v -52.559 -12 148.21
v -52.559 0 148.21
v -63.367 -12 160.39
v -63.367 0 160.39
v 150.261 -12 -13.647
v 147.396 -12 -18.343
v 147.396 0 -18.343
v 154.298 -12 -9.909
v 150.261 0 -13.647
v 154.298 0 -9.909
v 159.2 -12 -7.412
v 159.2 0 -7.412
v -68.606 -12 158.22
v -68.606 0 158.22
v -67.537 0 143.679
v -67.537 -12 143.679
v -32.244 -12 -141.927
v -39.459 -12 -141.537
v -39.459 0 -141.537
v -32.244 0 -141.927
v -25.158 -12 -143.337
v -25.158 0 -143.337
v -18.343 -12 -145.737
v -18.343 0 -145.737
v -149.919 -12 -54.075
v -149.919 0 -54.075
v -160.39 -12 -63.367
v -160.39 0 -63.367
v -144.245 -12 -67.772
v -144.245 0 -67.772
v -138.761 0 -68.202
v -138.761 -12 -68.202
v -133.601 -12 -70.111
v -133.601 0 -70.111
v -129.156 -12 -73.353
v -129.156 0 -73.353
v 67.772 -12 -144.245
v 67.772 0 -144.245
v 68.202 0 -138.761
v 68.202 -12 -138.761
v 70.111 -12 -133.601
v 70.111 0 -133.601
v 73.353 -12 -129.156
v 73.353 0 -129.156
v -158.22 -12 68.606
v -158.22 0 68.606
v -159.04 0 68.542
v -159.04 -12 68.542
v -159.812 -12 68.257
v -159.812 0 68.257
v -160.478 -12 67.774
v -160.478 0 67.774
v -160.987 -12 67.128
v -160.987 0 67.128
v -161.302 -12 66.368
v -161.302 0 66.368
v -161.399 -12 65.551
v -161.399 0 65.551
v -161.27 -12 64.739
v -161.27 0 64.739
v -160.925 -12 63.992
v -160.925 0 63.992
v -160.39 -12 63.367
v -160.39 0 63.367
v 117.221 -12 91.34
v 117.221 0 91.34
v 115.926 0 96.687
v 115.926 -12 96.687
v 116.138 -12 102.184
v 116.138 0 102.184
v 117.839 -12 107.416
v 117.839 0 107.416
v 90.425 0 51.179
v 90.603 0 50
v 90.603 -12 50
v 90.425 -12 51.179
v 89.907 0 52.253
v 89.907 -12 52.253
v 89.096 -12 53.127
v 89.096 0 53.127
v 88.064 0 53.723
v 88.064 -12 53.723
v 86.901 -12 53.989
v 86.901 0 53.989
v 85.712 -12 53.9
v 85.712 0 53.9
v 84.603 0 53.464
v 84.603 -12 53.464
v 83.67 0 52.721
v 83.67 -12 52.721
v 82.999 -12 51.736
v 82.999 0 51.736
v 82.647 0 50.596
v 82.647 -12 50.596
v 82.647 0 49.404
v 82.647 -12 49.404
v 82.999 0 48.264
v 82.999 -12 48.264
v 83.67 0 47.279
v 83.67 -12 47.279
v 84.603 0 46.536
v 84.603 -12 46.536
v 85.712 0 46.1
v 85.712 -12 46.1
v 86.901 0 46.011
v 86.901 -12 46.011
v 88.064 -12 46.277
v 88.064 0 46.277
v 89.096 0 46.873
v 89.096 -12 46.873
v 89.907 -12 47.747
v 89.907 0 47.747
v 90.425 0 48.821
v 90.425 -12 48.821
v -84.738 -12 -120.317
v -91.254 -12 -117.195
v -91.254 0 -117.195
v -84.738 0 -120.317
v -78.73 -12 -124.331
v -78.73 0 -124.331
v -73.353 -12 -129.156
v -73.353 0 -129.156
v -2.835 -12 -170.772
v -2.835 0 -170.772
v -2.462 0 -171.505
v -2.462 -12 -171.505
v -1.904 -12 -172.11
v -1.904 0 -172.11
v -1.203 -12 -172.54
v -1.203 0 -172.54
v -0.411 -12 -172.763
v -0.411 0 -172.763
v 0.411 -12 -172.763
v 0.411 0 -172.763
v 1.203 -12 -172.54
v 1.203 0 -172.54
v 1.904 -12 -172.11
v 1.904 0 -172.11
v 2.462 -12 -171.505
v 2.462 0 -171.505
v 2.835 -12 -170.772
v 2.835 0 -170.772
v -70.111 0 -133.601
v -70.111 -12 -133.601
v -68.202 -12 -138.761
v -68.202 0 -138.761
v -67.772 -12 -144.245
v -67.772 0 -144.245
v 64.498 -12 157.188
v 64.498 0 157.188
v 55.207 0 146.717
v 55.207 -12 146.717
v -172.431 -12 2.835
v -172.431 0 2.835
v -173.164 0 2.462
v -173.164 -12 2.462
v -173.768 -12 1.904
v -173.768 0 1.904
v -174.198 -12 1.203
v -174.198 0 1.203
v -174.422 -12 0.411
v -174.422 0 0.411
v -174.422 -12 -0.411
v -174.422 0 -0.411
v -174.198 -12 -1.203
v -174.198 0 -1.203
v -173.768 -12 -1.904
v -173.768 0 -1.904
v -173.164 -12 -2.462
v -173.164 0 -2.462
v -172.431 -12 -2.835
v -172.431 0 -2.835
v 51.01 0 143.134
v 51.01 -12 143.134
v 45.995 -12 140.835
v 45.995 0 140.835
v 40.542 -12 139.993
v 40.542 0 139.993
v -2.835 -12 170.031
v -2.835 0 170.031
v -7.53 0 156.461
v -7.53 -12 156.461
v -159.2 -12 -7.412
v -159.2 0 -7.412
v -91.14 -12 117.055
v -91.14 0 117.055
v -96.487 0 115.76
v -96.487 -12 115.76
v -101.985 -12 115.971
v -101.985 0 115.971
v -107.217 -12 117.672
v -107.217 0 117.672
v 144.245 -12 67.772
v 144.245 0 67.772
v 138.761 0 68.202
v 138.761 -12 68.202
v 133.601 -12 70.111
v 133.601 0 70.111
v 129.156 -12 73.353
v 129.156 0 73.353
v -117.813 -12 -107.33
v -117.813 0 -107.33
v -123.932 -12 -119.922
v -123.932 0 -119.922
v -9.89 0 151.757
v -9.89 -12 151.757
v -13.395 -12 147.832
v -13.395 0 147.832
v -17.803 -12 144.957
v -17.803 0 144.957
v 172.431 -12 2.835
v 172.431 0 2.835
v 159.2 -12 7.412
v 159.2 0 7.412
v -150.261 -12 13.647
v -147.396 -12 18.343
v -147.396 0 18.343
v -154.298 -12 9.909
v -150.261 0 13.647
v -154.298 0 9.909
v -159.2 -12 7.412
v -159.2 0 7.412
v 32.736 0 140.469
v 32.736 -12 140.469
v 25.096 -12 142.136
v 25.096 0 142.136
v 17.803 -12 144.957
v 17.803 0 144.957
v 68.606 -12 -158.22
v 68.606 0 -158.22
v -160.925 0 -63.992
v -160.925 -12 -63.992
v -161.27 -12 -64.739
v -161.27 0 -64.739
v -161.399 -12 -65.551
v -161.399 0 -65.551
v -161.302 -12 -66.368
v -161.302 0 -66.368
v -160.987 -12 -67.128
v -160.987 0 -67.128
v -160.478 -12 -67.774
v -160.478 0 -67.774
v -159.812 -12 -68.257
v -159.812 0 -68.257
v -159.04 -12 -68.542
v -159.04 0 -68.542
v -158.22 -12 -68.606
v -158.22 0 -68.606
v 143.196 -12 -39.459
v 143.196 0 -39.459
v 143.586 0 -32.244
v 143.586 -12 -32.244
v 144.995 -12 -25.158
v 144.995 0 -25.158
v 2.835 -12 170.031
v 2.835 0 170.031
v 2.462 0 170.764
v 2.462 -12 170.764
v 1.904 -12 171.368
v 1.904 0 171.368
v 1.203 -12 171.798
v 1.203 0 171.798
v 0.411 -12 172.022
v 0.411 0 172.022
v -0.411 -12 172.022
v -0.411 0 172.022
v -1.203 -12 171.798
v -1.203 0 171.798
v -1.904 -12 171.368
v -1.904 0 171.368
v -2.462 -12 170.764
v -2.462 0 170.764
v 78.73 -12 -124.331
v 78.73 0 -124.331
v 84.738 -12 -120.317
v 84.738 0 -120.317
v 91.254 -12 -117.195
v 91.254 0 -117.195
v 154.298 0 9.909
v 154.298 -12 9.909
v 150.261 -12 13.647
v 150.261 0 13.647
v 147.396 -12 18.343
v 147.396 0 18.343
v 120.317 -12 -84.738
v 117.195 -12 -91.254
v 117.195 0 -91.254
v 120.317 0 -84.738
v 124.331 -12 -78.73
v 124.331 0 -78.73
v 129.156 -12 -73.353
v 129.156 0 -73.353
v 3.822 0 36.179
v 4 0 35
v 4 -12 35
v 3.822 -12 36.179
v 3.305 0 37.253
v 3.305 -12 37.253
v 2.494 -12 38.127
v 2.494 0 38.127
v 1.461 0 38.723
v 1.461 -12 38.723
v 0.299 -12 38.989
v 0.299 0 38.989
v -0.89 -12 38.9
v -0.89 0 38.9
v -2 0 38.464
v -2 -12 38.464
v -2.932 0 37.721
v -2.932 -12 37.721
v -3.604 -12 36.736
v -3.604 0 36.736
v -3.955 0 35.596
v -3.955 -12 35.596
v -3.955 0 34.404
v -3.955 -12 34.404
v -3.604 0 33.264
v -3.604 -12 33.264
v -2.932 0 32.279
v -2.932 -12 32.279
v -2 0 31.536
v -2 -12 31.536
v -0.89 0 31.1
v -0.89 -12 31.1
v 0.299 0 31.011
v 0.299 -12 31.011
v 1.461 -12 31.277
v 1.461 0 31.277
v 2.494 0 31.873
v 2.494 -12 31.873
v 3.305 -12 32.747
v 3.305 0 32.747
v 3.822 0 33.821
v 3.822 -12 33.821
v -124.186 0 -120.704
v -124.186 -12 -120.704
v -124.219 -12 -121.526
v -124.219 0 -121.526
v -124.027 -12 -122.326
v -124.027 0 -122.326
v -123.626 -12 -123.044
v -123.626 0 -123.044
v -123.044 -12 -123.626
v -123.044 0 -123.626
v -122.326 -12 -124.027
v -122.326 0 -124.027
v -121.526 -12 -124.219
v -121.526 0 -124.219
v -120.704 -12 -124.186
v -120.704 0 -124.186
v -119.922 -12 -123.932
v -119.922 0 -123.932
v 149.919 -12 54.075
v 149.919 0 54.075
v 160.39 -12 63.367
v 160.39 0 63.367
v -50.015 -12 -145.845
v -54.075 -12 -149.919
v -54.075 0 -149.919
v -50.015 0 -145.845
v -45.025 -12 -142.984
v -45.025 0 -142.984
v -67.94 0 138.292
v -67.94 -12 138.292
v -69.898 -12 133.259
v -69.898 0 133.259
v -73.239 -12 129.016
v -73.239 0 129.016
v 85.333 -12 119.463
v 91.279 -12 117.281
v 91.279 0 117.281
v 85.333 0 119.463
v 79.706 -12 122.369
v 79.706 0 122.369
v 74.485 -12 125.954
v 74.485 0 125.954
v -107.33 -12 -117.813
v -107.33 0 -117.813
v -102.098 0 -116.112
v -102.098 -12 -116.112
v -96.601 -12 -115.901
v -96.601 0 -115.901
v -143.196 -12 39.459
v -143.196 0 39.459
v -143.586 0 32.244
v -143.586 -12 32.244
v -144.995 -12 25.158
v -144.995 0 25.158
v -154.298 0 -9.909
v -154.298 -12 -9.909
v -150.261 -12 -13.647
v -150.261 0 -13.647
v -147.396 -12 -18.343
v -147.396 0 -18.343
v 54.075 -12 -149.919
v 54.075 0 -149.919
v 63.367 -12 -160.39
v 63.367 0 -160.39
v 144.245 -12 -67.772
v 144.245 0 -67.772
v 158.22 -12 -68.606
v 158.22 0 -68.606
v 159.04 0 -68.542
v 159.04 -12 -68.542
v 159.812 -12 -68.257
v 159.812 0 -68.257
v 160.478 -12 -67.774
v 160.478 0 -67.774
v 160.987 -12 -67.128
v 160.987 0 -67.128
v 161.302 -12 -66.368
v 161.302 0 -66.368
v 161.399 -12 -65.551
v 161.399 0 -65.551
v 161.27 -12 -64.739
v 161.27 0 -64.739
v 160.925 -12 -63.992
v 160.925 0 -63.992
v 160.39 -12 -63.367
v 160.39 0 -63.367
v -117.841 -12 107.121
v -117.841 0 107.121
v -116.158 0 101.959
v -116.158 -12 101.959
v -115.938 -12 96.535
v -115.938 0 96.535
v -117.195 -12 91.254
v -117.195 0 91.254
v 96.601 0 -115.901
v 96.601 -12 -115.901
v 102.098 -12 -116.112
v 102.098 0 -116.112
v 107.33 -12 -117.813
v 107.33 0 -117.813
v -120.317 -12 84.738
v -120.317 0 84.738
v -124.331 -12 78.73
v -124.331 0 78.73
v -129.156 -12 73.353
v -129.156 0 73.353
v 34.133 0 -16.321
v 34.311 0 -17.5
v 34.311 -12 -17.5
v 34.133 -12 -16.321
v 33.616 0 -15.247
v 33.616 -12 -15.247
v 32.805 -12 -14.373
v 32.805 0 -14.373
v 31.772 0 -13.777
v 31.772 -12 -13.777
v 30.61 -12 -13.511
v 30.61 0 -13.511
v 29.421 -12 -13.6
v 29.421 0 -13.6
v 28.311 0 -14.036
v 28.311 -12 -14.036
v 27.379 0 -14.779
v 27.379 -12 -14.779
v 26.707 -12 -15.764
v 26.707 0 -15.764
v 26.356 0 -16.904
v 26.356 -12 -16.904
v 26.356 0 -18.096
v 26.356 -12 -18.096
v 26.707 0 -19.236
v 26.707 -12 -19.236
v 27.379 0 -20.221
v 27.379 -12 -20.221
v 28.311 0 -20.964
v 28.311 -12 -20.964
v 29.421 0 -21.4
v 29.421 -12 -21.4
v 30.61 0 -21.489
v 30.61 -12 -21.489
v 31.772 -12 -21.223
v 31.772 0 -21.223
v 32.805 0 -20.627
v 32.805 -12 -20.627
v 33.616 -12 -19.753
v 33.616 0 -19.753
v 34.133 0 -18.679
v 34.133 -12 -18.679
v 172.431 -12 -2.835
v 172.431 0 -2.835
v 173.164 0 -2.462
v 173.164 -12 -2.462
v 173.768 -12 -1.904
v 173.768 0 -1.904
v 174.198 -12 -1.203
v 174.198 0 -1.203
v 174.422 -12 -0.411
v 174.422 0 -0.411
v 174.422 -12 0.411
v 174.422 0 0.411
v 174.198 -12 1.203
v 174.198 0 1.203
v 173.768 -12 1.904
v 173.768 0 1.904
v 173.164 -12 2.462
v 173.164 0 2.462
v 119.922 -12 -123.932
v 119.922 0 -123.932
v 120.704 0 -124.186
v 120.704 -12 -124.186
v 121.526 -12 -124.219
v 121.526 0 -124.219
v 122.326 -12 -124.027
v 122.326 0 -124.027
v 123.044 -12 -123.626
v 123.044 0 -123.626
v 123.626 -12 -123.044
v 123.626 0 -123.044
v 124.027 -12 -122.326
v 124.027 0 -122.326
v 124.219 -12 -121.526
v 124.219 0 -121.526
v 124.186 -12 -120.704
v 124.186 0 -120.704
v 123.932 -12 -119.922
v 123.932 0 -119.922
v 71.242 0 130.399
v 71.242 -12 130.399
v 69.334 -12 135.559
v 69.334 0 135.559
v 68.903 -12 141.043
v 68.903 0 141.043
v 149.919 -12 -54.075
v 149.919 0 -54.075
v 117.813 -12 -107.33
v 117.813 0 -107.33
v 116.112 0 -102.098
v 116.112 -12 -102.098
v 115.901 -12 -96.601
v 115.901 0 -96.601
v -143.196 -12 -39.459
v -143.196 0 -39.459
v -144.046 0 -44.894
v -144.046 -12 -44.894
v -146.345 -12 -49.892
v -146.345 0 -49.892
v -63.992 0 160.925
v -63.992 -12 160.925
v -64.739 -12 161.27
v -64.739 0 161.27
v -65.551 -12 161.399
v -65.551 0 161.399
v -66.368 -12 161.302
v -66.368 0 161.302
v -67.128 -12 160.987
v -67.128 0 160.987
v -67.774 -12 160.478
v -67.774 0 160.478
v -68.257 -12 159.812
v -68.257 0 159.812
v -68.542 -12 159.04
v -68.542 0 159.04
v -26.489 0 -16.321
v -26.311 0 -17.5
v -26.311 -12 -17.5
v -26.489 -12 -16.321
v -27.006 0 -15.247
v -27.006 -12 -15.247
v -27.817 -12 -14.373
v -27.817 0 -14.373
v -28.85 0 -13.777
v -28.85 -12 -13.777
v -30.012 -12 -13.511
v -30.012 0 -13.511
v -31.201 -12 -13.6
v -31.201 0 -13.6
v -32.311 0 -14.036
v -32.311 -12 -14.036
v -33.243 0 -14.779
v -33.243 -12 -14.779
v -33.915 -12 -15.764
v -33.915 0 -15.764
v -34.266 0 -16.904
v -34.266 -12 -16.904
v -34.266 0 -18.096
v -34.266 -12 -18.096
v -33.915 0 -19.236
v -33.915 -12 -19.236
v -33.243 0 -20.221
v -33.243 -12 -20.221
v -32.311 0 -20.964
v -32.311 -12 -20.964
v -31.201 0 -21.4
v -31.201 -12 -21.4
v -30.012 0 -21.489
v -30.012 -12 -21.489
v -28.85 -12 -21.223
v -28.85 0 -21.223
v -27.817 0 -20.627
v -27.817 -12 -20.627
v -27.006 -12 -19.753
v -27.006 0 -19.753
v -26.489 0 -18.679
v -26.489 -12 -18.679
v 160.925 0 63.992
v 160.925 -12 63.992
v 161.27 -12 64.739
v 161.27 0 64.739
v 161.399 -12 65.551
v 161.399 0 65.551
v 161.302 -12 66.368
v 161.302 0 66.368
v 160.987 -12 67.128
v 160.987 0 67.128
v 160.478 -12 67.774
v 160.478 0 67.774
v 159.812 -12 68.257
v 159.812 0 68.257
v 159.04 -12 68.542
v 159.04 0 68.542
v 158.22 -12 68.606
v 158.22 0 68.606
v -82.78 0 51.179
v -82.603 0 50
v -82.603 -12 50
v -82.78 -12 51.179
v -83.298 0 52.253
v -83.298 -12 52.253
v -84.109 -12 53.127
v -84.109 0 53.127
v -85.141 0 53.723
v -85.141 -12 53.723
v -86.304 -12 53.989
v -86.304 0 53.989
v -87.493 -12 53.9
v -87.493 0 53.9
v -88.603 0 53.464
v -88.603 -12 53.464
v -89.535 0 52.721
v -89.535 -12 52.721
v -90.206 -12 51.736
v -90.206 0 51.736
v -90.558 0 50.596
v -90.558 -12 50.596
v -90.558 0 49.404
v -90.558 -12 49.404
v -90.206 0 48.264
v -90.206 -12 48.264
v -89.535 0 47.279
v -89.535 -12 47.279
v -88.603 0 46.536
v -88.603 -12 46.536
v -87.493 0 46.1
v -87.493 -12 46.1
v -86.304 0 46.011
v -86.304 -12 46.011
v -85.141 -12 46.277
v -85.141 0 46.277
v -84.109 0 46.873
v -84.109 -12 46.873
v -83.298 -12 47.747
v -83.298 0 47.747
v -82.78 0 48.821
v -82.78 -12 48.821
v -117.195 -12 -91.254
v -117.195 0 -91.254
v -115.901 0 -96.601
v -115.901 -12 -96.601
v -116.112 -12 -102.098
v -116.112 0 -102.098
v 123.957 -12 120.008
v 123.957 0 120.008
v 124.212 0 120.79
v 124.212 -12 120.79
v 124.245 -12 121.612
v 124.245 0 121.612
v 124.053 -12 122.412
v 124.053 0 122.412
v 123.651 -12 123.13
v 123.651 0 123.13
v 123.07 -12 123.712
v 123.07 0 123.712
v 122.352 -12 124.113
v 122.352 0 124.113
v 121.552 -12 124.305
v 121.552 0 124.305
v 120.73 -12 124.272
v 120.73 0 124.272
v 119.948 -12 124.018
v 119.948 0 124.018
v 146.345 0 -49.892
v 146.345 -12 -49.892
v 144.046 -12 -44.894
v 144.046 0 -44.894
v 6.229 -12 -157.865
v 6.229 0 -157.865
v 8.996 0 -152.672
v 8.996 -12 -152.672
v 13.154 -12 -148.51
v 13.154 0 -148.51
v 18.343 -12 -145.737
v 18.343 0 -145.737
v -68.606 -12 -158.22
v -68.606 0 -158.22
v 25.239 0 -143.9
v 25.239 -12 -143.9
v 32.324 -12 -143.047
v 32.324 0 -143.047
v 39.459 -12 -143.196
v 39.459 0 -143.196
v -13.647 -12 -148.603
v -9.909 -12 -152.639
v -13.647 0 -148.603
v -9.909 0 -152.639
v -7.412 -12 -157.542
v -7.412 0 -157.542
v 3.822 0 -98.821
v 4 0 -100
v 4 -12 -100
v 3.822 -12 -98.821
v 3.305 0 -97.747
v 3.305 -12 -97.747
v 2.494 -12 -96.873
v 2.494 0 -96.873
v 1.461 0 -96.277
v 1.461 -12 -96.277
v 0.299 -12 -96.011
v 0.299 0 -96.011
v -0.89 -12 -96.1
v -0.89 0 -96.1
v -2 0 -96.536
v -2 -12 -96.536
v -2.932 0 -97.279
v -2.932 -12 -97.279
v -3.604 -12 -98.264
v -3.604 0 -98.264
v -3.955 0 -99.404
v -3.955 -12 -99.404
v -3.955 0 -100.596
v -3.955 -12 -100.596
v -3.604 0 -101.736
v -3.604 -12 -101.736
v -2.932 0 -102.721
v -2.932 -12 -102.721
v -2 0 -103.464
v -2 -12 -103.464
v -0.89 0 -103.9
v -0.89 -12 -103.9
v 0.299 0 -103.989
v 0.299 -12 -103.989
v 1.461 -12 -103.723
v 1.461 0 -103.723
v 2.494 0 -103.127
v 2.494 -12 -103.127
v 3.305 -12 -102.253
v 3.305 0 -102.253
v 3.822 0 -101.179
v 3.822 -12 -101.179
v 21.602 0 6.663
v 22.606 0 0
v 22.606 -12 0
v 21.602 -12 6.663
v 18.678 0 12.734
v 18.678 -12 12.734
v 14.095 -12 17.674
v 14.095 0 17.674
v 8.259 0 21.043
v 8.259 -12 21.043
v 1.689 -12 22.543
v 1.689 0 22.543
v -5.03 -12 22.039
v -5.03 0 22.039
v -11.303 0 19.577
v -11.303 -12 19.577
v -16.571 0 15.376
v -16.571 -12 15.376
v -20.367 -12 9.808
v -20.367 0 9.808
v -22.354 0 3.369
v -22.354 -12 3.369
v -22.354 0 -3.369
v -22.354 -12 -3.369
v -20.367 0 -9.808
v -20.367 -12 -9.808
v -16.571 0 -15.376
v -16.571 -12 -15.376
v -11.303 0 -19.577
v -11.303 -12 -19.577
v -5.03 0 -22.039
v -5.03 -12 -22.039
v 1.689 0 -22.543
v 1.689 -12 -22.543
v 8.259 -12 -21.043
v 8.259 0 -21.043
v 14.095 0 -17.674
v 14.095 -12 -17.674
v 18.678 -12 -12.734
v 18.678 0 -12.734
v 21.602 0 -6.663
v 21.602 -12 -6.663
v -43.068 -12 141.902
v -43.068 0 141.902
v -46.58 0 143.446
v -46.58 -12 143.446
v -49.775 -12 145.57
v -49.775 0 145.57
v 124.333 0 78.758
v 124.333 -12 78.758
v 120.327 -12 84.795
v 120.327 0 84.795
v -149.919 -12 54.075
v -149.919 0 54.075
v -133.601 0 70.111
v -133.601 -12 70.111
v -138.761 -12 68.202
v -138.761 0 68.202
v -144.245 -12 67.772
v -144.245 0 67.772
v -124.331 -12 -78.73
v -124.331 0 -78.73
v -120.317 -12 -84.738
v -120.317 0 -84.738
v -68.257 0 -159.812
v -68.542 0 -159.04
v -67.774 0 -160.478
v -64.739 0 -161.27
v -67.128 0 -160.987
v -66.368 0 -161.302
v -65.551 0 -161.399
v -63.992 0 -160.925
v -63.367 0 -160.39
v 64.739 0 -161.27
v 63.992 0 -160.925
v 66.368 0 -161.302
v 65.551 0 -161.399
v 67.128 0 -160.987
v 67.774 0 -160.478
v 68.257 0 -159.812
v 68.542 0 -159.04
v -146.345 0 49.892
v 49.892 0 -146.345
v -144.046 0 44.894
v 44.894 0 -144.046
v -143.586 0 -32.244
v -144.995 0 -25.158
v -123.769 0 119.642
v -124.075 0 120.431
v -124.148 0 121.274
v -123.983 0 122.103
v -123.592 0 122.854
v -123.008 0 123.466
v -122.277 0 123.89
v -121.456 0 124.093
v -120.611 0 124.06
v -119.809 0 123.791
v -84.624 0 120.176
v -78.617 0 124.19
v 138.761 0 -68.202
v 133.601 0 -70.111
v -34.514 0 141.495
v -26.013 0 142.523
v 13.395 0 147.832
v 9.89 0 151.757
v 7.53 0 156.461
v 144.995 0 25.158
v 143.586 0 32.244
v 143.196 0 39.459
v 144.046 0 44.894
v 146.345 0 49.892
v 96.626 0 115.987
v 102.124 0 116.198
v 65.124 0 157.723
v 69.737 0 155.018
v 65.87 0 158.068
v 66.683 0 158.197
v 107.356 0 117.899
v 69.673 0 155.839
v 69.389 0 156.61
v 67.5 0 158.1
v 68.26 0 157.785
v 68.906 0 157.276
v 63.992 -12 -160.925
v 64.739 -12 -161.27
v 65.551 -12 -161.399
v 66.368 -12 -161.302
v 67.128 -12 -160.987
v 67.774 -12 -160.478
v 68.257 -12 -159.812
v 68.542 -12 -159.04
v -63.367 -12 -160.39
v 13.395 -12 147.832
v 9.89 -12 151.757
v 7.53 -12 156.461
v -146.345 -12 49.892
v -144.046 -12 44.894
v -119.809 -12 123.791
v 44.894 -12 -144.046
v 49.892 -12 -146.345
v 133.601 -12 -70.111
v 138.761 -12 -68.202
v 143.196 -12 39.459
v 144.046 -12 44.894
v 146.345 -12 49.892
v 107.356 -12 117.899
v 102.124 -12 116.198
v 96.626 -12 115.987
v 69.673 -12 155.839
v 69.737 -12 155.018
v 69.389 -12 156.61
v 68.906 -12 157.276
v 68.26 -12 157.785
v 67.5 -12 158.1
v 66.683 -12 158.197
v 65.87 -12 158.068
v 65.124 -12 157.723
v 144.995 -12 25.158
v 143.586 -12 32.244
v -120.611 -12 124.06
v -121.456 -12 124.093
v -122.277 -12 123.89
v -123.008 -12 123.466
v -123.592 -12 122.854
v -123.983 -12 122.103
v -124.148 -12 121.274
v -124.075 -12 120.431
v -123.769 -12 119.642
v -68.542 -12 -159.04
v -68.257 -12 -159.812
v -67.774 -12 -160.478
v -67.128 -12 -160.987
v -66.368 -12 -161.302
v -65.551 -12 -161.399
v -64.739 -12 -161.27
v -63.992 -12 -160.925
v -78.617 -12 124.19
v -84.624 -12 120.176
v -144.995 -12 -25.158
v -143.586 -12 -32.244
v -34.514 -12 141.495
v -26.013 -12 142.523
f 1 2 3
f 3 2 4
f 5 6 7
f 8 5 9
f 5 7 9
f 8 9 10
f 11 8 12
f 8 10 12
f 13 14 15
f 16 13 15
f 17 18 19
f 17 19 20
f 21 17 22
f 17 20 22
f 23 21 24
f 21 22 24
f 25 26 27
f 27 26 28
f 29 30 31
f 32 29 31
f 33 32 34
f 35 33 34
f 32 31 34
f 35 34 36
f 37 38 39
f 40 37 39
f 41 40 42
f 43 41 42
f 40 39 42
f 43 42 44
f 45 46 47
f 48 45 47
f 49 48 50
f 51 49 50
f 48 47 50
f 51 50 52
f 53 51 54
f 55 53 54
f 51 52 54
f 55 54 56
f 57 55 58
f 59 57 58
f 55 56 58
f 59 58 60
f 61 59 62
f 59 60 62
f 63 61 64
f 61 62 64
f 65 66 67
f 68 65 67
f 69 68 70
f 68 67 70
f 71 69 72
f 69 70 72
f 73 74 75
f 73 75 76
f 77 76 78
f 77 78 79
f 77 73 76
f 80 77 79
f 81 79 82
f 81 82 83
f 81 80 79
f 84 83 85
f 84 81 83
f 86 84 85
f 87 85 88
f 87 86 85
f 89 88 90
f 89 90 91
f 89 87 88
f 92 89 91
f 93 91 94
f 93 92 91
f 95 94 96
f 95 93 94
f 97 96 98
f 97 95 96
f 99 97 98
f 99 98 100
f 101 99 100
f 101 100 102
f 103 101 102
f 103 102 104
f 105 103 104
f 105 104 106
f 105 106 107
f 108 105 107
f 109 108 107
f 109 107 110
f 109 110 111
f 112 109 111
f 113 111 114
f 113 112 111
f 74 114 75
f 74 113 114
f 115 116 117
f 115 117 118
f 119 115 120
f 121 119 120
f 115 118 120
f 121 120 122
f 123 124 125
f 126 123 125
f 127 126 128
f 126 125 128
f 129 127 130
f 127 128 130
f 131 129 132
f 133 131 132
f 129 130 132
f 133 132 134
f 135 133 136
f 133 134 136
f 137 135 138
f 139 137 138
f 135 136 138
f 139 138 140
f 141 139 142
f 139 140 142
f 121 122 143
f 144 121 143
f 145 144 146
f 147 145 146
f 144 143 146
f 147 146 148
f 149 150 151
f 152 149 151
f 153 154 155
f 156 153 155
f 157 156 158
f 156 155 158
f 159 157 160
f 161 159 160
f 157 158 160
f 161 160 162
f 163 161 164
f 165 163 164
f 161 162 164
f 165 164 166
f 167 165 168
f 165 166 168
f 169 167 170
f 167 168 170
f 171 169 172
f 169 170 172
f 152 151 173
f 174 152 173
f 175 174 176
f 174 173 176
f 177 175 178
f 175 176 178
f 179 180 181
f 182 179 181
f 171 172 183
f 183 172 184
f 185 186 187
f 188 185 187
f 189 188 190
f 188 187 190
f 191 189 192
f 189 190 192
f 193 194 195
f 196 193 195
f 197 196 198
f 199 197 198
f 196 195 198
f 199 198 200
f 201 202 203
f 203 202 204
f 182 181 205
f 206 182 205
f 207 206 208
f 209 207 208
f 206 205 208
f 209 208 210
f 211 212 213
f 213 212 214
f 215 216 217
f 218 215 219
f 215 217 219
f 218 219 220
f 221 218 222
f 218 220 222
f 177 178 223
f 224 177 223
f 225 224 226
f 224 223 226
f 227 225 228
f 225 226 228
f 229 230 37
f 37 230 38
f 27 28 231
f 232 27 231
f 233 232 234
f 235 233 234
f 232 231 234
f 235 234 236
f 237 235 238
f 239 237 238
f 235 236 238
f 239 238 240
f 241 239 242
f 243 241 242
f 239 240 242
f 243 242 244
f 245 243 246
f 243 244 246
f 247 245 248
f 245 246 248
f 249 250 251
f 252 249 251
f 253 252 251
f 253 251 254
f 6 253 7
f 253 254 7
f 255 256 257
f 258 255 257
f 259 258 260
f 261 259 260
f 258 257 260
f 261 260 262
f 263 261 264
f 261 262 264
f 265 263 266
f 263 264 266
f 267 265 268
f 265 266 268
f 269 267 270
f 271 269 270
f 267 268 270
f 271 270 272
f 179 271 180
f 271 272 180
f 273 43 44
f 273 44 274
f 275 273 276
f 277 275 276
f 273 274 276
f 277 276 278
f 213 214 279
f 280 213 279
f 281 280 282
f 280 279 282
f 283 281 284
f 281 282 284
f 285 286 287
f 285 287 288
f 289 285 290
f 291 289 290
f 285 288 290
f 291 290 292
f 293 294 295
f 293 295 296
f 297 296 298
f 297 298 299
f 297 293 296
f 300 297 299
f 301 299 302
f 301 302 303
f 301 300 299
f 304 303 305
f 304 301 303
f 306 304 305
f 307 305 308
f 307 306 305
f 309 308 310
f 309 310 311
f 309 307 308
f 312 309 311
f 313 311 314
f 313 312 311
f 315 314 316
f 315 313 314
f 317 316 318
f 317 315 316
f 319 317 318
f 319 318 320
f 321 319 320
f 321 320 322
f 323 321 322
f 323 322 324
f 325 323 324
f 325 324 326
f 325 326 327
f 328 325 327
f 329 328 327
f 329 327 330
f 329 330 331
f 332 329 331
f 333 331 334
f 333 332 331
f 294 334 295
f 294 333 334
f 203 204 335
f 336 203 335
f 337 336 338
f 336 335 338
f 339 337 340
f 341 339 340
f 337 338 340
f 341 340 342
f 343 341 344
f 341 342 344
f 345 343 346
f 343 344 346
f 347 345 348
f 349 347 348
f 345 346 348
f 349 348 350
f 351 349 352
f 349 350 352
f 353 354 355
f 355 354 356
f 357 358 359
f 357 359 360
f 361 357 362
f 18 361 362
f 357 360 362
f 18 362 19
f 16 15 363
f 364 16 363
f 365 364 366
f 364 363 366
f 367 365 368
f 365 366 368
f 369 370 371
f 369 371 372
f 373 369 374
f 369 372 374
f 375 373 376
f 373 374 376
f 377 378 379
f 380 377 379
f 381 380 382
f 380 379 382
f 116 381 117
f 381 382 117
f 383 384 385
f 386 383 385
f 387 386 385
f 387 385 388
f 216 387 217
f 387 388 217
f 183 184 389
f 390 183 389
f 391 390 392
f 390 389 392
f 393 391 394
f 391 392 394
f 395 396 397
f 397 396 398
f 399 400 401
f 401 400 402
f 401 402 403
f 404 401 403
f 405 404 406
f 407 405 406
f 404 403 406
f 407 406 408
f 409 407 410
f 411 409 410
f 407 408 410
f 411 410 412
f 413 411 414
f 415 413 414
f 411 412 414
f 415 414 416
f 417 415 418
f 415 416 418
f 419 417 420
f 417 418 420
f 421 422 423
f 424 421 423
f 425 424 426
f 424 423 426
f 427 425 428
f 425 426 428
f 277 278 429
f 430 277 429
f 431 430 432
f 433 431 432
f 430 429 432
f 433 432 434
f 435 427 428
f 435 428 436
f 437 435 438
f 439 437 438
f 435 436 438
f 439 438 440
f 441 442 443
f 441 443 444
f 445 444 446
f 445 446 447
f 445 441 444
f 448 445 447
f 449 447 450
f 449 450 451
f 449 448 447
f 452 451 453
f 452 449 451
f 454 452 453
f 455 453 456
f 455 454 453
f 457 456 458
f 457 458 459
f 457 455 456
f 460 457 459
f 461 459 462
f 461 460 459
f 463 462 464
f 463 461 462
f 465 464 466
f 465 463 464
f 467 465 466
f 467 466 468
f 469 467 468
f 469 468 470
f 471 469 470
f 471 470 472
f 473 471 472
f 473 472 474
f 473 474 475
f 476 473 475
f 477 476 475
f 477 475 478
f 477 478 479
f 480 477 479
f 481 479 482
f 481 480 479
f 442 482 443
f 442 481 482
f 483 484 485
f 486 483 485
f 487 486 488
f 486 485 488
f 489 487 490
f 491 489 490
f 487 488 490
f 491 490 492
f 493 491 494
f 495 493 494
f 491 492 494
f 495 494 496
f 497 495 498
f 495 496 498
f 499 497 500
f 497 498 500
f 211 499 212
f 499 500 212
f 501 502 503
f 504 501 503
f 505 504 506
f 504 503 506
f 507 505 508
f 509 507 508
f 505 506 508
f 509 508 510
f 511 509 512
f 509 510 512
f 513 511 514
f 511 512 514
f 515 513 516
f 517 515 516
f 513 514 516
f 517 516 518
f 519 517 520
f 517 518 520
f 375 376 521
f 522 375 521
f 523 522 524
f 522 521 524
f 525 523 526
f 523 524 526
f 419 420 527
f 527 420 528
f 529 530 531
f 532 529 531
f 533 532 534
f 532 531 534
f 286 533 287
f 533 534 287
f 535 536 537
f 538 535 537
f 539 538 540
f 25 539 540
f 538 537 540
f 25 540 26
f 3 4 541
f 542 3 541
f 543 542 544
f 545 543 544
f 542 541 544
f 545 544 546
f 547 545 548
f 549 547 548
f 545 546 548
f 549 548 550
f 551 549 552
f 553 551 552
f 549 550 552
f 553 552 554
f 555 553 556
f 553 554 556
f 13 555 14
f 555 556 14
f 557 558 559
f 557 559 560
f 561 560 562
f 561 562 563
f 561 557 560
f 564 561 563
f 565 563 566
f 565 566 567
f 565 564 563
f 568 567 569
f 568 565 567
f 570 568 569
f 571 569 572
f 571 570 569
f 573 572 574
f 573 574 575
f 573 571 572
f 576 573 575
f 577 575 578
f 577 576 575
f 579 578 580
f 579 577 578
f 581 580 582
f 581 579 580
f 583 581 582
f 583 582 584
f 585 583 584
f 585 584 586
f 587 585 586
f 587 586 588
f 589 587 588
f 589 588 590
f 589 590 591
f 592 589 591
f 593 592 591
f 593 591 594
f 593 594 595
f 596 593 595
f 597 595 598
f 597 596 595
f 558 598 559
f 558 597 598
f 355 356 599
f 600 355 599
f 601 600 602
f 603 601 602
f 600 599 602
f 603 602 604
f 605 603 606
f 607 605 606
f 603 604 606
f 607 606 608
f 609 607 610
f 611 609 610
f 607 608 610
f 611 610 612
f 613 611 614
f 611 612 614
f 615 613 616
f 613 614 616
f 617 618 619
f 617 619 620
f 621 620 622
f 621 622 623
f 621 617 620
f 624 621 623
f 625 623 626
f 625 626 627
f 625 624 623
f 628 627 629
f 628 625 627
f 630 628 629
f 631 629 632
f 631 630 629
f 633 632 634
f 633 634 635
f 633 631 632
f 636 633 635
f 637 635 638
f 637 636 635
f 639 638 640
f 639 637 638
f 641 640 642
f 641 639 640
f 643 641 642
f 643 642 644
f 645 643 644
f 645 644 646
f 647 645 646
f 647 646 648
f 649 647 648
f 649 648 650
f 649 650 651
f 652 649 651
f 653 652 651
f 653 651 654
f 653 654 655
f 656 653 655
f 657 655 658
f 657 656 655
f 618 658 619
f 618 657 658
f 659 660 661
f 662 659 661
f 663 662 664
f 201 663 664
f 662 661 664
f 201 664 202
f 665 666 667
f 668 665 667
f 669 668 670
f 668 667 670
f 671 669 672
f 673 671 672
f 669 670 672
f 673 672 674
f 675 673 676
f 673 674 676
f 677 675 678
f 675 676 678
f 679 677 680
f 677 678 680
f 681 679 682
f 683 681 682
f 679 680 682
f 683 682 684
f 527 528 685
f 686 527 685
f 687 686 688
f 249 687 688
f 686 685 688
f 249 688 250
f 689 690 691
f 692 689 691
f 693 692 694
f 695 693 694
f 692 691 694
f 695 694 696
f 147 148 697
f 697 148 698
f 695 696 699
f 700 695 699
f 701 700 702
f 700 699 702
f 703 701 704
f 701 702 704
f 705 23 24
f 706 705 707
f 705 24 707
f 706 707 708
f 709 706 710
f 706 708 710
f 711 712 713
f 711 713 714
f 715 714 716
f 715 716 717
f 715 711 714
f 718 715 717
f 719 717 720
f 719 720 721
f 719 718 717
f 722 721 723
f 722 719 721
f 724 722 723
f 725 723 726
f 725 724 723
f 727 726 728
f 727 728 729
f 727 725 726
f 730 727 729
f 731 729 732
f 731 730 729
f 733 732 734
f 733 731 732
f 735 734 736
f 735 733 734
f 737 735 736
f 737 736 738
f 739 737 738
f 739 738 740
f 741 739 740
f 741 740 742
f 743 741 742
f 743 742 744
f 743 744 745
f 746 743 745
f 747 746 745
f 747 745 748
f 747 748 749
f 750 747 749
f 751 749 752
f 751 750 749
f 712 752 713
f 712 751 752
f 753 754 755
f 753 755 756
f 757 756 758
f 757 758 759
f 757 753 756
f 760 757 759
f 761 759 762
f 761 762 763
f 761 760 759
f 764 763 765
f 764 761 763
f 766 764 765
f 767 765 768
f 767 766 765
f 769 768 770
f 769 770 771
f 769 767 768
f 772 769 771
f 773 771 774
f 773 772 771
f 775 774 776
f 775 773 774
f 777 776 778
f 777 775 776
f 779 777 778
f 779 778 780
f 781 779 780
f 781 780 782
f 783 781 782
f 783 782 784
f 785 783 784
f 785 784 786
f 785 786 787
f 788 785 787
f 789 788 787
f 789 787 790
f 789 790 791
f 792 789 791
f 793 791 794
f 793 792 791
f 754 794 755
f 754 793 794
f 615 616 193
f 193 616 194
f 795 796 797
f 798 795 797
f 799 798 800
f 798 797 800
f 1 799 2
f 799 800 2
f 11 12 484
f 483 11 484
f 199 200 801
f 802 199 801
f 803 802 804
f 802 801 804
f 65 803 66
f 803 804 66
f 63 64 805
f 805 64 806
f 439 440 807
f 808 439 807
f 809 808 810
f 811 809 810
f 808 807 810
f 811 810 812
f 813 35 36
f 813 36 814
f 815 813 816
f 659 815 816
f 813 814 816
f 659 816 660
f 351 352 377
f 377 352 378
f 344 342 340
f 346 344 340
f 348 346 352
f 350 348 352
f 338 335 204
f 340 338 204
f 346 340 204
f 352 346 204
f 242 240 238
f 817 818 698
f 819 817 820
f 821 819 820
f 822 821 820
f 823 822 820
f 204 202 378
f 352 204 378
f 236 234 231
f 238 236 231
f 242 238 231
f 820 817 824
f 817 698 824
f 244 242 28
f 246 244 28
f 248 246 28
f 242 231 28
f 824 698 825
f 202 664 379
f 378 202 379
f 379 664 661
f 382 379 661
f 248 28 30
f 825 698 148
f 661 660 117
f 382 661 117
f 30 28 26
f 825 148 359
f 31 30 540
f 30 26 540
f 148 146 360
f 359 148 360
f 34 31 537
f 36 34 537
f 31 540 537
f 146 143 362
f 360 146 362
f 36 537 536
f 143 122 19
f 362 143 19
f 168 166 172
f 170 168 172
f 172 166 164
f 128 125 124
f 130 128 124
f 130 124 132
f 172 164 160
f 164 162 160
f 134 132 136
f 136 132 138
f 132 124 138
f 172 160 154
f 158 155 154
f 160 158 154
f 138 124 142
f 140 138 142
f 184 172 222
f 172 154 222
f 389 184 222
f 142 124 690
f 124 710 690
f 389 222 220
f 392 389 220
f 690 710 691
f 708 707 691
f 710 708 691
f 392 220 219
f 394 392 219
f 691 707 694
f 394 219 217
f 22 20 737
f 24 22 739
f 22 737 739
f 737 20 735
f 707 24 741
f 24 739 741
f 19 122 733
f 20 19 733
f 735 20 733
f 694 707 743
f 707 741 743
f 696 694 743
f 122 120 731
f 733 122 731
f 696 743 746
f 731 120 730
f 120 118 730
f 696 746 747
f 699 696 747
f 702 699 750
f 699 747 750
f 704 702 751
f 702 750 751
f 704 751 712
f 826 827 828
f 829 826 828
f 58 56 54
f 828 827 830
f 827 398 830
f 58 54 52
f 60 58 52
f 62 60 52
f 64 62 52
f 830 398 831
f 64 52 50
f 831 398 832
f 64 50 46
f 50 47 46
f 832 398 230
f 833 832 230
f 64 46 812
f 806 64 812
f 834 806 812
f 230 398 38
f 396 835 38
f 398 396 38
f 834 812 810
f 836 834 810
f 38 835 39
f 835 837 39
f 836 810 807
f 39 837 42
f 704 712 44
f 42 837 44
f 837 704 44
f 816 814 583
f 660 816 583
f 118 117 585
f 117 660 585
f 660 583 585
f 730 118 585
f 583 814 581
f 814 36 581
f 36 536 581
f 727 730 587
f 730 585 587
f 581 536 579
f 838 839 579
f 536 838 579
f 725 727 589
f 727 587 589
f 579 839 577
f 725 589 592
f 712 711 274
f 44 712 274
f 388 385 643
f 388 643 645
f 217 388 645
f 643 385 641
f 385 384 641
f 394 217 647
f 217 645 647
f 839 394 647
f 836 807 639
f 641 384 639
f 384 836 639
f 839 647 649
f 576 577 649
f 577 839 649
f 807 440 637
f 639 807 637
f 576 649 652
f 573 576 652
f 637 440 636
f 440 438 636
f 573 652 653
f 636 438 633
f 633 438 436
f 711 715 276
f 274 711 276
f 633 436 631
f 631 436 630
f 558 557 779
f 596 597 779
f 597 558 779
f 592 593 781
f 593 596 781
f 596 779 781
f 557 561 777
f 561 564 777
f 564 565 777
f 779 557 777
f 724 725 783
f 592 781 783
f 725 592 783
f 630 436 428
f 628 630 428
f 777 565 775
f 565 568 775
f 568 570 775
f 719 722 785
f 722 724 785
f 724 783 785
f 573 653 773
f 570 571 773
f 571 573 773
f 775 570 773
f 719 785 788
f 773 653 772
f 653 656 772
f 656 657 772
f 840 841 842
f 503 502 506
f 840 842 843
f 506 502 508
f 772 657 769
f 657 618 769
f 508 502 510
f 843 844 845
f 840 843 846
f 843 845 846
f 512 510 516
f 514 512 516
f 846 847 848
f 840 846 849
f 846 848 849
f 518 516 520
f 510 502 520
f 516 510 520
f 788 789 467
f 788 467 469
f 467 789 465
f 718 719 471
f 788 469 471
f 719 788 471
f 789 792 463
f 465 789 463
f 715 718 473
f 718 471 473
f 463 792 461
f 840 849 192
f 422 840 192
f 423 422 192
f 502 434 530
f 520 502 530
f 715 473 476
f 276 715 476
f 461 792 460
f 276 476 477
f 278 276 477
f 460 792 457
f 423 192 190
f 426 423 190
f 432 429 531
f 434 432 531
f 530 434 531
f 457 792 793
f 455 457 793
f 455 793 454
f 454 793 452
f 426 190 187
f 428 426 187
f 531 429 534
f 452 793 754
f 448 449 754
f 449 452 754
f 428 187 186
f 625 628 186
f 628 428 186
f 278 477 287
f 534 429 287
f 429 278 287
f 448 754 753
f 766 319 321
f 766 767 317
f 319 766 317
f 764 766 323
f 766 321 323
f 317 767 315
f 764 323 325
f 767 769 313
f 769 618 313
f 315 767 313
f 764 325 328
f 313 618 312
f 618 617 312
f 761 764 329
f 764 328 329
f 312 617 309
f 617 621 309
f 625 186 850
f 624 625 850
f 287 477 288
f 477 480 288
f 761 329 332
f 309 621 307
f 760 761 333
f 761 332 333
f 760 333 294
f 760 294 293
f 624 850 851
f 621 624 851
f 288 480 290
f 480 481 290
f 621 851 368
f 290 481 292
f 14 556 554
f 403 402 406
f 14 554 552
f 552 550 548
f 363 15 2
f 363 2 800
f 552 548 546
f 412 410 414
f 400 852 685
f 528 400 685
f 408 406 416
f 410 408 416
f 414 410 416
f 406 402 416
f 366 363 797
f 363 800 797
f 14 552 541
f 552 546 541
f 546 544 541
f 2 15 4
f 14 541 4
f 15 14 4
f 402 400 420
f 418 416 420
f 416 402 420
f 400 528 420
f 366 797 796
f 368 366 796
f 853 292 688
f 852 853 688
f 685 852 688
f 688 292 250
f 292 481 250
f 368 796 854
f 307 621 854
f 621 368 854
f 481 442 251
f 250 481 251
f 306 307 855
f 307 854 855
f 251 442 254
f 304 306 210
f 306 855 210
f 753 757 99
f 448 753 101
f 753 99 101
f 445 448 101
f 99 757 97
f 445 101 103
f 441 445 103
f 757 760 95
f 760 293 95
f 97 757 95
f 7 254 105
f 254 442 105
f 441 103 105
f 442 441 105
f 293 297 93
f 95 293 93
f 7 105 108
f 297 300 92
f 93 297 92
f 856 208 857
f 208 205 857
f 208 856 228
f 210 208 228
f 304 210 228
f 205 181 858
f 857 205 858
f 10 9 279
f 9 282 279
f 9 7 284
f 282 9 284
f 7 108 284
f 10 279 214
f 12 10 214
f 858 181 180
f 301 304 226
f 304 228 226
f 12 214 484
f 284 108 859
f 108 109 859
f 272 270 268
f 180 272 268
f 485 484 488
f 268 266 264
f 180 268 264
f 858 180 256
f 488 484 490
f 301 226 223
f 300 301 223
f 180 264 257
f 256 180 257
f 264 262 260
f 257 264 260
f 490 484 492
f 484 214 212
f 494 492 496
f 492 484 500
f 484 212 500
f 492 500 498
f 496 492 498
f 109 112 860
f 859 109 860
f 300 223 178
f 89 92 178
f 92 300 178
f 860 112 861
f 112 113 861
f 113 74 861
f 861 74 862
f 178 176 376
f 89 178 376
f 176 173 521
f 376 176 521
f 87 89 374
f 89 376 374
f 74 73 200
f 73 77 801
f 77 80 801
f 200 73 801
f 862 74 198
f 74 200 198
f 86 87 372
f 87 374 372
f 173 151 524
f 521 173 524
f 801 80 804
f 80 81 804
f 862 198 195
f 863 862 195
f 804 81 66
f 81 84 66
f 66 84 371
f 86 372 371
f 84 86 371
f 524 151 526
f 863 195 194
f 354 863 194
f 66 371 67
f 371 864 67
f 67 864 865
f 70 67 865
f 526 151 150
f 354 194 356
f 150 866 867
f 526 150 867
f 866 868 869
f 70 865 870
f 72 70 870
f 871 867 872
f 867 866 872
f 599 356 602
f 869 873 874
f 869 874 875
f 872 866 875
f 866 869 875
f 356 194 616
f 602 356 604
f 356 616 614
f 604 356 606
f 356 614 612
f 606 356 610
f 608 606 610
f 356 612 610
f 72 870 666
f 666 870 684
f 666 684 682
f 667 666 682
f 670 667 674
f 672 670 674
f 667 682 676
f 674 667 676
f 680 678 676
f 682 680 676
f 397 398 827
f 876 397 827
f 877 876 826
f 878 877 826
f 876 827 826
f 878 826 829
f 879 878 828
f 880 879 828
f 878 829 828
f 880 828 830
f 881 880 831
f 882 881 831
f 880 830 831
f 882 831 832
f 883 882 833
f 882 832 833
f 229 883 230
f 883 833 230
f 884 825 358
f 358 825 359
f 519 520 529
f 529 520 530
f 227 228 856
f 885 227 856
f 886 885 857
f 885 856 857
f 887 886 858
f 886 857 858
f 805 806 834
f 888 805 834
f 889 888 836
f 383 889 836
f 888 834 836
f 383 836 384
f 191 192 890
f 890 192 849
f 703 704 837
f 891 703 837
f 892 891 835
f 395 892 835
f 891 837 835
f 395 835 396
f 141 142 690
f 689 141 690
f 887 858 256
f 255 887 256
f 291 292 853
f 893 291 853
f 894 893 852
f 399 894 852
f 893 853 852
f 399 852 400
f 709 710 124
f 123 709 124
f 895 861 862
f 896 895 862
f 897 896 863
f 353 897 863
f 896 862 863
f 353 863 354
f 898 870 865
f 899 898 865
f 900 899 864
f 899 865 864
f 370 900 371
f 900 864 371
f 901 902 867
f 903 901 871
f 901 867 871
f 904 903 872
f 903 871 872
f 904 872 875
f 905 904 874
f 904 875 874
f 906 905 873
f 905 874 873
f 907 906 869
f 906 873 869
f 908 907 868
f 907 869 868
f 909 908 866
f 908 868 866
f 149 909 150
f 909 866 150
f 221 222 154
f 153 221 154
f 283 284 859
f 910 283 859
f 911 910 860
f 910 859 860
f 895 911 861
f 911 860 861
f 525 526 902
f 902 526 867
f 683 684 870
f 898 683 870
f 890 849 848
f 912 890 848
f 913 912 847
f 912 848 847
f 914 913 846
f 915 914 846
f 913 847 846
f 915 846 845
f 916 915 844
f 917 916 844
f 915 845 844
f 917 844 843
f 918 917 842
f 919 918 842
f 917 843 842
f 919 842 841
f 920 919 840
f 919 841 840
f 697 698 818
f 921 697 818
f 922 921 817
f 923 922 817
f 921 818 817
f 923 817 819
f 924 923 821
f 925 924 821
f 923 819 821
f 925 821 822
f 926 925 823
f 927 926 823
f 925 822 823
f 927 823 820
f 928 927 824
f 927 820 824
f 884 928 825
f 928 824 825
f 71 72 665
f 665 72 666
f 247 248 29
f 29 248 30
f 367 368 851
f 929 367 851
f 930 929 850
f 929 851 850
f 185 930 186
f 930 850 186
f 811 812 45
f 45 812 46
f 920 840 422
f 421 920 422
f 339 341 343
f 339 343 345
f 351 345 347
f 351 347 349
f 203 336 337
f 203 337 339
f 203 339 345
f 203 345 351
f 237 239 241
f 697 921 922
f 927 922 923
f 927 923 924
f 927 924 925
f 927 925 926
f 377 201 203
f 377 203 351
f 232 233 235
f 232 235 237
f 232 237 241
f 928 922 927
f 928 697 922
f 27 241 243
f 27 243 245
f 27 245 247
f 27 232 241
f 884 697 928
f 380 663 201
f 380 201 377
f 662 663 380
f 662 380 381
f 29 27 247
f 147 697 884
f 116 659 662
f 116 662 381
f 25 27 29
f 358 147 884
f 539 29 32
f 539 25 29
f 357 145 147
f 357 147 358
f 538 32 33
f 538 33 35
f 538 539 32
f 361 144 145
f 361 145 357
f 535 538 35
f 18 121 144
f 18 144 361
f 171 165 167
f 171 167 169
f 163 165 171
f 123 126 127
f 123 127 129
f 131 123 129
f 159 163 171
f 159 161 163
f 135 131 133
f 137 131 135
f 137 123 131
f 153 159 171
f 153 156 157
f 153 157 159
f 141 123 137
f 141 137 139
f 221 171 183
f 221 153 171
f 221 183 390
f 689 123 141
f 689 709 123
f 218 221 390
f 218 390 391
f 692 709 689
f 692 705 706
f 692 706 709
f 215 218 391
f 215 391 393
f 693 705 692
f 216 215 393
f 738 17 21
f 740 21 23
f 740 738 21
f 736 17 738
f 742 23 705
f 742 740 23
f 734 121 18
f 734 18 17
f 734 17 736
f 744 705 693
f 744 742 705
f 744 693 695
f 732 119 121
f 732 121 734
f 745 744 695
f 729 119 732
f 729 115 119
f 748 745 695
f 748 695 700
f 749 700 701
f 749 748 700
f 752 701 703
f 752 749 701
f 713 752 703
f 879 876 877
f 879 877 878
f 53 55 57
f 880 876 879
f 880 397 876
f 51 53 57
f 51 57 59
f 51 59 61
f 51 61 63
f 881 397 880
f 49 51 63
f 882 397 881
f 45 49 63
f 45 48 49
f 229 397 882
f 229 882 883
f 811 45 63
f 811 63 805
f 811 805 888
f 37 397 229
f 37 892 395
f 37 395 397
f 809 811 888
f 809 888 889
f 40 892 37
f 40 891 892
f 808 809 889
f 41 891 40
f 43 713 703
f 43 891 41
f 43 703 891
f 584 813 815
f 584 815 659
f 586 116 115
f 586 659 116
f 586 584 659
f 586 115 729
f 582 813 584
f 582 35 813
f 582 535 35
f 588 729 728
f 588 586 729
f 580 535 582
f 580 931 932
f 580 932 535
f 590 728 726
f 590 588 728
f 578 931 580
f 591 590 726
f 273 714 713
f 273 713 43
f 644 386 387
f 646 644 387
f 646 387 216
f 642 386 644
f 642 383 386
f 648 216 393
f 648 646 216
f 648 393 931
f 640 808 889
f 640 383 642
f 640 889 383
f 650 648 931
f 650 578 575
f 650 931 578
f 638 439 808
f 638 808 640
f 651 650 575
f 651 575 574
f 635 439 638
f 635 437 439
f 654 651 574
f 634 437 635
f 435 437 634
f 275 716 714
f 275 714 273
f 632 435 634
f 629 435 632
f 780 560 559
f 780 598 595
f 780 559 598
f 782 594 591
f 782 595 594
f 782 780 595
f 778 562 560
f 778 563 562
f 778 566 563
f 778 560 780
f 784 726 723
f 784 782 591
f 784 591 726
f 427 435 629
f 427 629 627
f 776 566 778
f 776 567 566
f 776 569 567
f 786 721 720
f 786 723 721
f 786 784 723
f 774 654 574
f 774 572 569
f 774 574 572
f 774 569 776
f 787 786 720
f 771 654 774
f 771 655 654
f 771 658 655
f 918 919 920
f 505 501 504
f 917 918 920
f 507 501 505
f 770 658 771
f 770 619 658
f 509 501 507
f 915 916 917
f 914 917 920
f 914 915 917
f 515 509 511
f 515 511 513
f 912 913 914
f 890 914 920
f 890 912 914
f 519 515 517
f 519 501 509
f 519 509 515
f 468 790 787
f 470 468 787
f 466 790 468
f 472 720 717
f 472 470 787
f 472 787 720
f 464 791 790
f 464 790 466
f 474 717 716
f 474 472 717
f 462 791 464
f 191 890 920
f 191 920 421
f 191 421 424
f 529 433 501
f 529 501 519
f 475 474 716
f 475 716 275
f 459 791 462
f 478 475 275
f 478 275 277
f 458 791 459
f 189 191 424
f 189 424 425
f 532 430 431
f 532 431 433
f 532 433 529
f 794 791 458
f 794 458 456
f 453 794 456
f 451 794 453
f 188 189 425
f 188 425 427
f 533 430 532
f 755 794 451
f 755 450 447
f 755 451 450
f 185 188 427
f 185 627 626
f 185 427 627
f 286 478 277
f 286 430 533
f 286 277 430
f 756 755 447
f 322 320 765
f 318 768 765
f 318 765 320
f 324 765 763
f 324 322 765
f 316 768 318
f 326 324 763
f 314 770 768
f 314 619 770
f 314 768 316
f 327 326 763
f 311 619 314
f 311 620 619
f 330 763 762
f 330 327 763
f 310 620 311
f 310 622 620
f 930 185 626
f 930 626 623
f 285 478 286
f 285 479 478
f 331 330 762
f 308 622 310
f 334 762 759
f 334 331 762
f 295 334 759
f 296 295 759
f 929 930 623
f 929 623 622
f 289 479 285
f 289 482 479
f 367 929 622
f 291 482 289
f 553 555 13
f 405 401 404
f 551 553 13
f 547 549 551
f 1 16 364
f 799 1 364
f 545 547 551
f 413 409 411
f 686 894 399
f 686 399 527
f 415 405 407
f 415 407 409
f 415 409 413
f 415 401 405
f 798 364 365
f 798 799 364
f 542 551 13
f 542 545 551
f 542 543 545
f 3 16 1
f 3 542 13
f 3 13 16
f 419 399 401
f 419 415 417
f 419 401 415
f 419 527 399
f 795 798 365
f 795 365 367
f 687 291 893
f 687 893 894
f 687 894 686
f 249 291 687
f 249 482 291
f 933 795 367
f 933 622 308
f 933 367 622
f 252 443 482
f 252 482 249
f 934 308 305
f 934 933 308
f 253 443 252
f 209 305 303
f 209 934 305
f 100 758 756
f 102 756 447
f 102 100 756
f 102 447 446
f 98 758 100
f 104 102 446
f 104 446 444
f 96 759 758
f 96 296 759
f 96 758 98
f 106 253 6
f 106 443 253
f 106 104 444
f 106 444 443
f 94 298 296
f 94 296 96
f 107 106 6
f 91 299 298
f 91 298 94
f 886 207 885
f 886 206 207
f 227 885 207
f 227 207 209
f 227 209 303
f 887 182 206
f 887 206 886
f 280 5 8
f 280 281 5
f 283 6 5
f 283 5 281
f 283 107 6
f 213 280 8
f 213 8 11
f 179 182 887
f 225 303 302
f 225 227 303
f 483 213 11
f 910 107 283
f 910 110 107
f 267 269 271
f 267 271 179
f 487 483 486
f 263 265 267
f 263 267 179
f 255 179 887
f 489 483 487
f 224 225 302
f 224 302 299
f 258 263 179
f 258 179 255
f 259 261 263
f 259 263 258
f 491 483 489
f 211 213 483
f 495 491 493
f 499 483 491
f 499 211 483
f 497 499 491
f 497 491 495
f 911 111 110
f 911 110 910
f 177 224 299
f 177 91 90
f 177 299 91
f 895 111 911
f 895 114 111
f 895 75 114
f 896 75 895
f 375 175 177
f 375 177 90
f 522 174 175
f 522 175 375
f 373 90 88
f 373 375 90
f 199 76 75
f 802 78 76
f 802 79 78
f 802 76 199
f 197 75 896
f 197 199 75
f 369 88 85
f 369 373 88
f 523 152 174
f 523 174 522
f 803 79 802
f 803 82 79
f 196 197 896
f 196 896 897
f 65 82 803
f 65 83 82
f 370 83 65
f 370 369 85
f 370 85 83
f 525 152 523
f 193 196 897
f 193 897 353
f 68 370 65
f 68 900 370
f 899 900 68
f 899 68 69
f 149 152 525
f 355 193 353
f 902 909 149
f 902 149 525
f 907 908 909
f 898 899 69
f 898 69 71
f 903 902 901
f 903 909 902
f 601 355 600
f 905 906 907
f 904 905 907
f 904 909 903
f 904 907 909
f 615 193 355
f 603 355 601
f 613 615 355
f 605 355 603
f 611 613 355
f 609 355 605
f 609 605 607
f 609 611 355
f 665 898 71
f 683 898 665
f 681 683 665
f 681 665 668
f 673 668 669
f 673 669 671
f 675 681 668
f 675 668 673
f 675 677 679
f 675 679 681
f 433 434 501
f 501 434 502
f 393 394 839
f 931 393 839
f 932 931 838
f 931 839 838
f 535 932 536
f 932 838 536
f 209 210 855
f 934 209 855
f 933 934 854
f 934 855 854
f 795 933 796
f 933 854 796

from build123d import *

# Parameters (mm, degrees)
F0_R     = 4
F0_R_2   = 22.606
F1_DEPTH = 12


with BuildPart() as f1:
    # F0 (on Front) → F1 (new body)
    with BuildSketch(Plane.XZ):
        with BuildLine():
            ThreePointArc((17.802502, 144.956856), (11.512632, 149.678862), (7.529827, 156.460976))
            Line((7.529827, 156.460976), (2.835124, 170.030854))
            ThreePointArc((2.835124, 170.030854), (0, 172.05), (-2.835124, 170.030854))
            Line((-2.835124, 170.030854), (-7.529827, 156.460976))
            ThreePointArc((-7.529827, 156.460976), (-11.512632, 149.678862), (-17.802502, 144.956856))
            ThreePointArc((-17.802502, 144.956856), (-30.241911, 141.830071), (-43.068077, 141.901717))
            ThreePointArc((-43.068077, 141.901717), (-48.22329, 144.439154), (-52.558881, 148.209759))
            Line((-52.558881, 148.209759), (-63.367118, 160.390291))
            ThreePointArc((-63.367118, 160.390291), (-66.759125, 161.170784), (-68.605744, 158.220382))
            Line((-68.605744, 158.220382), (-67.53653, 143.678524))
            ThreePointArc((-67.53653, 143.678524), (-68.731889, 135.702982), (-73.239492, 129.015707))
            ThreePointArc((-73.239492, 129.015707), (-81.548929, 122.076108), (-91.140166, 117.054859))
            ThreePointArc((-91.140166, 117.054859), (-99.243222, 115.675861), (-107.216606, 117.672431))
            Line((-107.216606, 117.672431), (-119.808645, 123.791189))
            ThreePointArc((-119.808645, 123.791189), (-123.3221, 123.180437), (-123.769366, 119.642452))
            Line((-123.769366, 119.642452), (-117.840644, 107.121025))
            ThreePointArc((-117.840644, 107.121025), (-115.861515, 99.254778), (-117.195431, 91.253812))
            ThreePointArc((-117.195431, 91.253812), (-122.21668, 81.662575), (-129.156279, 73.353138))
            ThreePointArc((-129.156279, 73.353138), (-136.114807, 68.978205), (-144.245307, 67.771513))
            Line((-144.245307, 67.771513), (-158.220382, 68.605744))
            ThreePointArc((-158.220382, 68.605744), (-161.170784, 66.759125), (-160.390291, 63.367118))
            Line((-160.390291, 63.367118), (-149.918532, 54.075138))
            ThreePointArc((-149.918532, 54.075138), (-145.022659, 47.472746), (-143.195782, 39.458779))
            ThreePointArc((-143.195782, 39.458779), (-144.164403, 28.676083), (-147.395873, 18.343495))
            ThreePointArc((-147.395873, 18.343495), (-152.1505, 11.638671), (-159.200322, 7.412425))
            Line((-159.200322, 7.412425), (-172.430854, 2.835124))
            ThreePointArc((-172.430854, 2.835124), (-174.45, 0), (-172.430854, -2.835124))
            Line((-172.430854, -2.835124), (-159.200322, -7.412425))
            ThreePointArc((-159.200322, -7.412425), (-152.1505, -11.638671), (-147.395873, -18.343495))
            ThreePointArc((-147.395873, -18.343495), (-144.164403, -28.676083), (-143.195782, -39.458779))
            ThreePointArc((-143.195782, -39.458779), (-145.022659, -47.472746), (-149.918532, -54.075138))
            Line((-149.918532, -54.075138), (-160.390291, -63.367118))
            ThreePointArc((-160.390291, -63.367118), (-161.170784, -66.759125), (-158.220382, -68.605744))
            Line((-158.220382, -68.605744), (-144.245307, -67.771513))
            ThreePointArc((-144.245307, -67.771513), (-136.114807, -68.978205), (-129.156279, -73.353138))
            ThreePointArc((-129.156279, -73.353138), (-122.21668, -81.662575), (-117.195431, -91.253812))
            ThreePointArc((-117.195431, -91.253812), (-115.816433, -99.356868), (-117.813003, -107.330252))
            Line((-117.813003, -107.330252), (-123.931761, -119.922291))
            ThreePointArc((-123.931761, -119.922291), (-123.354778, -123.354778), (-119.922291, -123.931761))
            Line((-119.922291, -123.931761), (-107.330252, -117.813003))
            ThreePointArc((-107.330252, -117.813003), (-99.356868, -115.816433), (-91.253812, -117.195431))
            ThreePointArc((-91.253812, -117.195431), (-81.662575, -122.21668), (-73.353138, -129.156279))
            ThreePointArc((-73.353138, -129.156279), (-68.978205, -136.114807), (-67.771513, -144.245307))
            Line((-67.771513, -144.245307), (-68.605744, -158.220382))
            ThreePointArc((-68.605744, -158.220382), (-66.759125, -161.170784), (-63.367118, -160.390291))
            Line((-63.367118, -160.390291), (-54.075138, -149.918532))
            ThreePointArc((-54.075138, -149.918532), (-47.615399, -144.248208), (-39.458779, -141.537052))
            ThreePointArc((-39.458779, -141.537052), (-28.676083, -142.505673), (-18.343495, -145.737143))
            ThreePointArc((-18.343495, -145.737143), (-11.638671, -150.49177), (-7.412425, -157.541592))
            Line((-7.412425, -157.541592), (-2.835124, -170.772123))
            ThreePointArc((-2.835124, -170.772123), (0, -172.79127), (2.835124, -170.772123))
            Line((2.835124, -170.772123), (6.228962, -157.864794))
            ThreePointArc((6.228962, -157.864794), (10.92106, -150.437277), (18.343495, -145.737143))
            ThreePointArc((18.343495, -145.737143), (28.766653, -143.349083), (39.458779, -143.195782))
            ThreePointArc((39.458779, -143.195782), (47.472746, -145.022659), (54.075138, -149.918532))
            Line((54.075138, -149.918532), (63.367118, -160.390291))
            ThreePointArc((63.367118, -160.390291), (66.759125, -161.170784), (68.605744, -158.220382))
            Line((68.605744, -158.220382), (67.771513, -144.245307))
            ThreePointArc((67.771513, -144.245307), (68.978205, -136.114807), (73.353138, -129.156279))
            ThreePointArc((73.353138, -129.156279), (81.662575, -122.21668), (91.253812, -117.195431))
            ThreePointArc((91.253812, -117.195431), (99.356868, -115.816433), (107.330252, -117.813003))
            Line((107.330252, -117.813003), (119.922291, -123.931761))
            ThreePointArc((119.922291, -123.931761), (123.354778, -123.354778), (123.931761, -119.922291))
            Line((123.931761, -119.922291), (117.813003, -107.330252))
            ThreePointArc((117.813003, -107.330252), (115.816433, -99.356868), (117.195431, -91.253812))
            ThreePointArc((117.195431, -91.253812), (122.21668, -81.662575), (129.156279, -73.353138))
            ThreePointArc((129.156279, -73.353138), (136.114807, -68.978205), (144.245307, -67.771513))
            Line((144.245307, -67.771513), (158.220382, -68.605744))
            ThreePointArc((158.220382, -68.605744), (161.170784, -66.759125), (160.390291, -63.367118))
            Line((160.390291, -63.367118), (149.918532, -54.075138))
            ThreePointArc((149.918532, -54.075138), (145.022659, -47.472746), (143.195782, -39.458779))
            ThreePointArc((143.195782, -39.458779), (144.164403, -28.676083), (147.395873, -18.343495))
            ThreePointArc((147.395873, -18.343495), (152.1505, -11.638671), (159.200322, -7.412425))
            Line((159.200322, -7.412425), (172.430854, -2.835124))
            ThreePointArc((172.430854, -2.835124), (174.45, 0), (172.430854, 2.835124))
            Line((172.430854, 2.835124), (159.200322, 7.412425))
            ThreePointArc((159.200322, 7.412425), (152.1505, 11.638671), (147.395873, 18.343495))
            ThreePointArc((147.395873, 18.343495), (144.164403, 28.676083), (143.195782, 39.458779))
            ThreePointArc((143.195782, 39.458779), (145.022659, 47.472746), (149.918532, 54.075138))
            Line((149.918532, 54.075138), (160.390291, 63.367118))
            ThreePointArc((160.390291, 63.367118), (161.170784, 66.759125), (158.220382, 68.605744))
            Line((158.220382, 68.605744), (144.245307, 67.771513))
            ThreePointArc((144.245307, 67.771513), (136.114807, 68.978205), (129.156279, 73.353138))
            ThreePointArc((129.156279, 73.353138), (122.222235, 81.705182), (117.22101, 91.339774))
            ThreePointArc((117.22101, 91.339774), (115.842012, 99.442829), (117.838582, 107.416213))
            Line((117.838582, 107.416213), (123.95734, 120.008252))
            ThreePointArc((123.95734, 120.008252), (123.380357, 123.44074), (119.94787, 124.017723))
            Line((119.94787, 124.017723), (107.35583, 117.898965))
            ThreePointArc((107.35583, 117.898965), (99.382446, 115.902395), (91.279391, 117.281393))
            ThreePointArc((91.279391, 117.281393), (82.47428, 120.828447), (74.484519, 125.95439))
            ThreePointArc((74.484519, 125.95439), (70.109586, 132.912918), (68.902895, 141.043418))
            Line((68.902895, 141.043418), (69.737125, 155.018493))
            ThreePointArc((69.737125, 155.018493), (67.890506, 157.968896), (64.498499, 157.188402))
            Line((64.498499, 157.188402), (55.206519, 146.716643))
            ThreePointArc((55.206519, 146.716643), (48.58216, 141.810683), (40.541822, 139.993122))
            ThreePointArc((40.541822, 139.993122), (28.884055, 141.155145), (17.802502, 144.956856))
        make_face()
        with Locations((-30.310889, -17.5)):
            Circle(F0_R, mode=Mode.SUBTRACT)
        with Locations((0, -100)):
            Circle(F0_R, mode=Mode.SUBTRACT)
        with Locations((30.310889, -17.5)):
            Circle(F0_R, mode=Mode.SUBTRACT)
        with Locations((-86.60254, 50)):
            Circle(F0_R, mode=Mode.SUBTRACT)
        Circle(F0_R_2, mode=Mode.SUBTRACT)
        with Locations((0, 35)):
            Circle(F0_R, mode=Mode.SUBTRACT)
        with Locations((86.60254, 50)):
            Circle(F0_R, mode=Mode.SUBTRACT)
    extrude(amount=F1_DEPTH)


solid = f1.part
